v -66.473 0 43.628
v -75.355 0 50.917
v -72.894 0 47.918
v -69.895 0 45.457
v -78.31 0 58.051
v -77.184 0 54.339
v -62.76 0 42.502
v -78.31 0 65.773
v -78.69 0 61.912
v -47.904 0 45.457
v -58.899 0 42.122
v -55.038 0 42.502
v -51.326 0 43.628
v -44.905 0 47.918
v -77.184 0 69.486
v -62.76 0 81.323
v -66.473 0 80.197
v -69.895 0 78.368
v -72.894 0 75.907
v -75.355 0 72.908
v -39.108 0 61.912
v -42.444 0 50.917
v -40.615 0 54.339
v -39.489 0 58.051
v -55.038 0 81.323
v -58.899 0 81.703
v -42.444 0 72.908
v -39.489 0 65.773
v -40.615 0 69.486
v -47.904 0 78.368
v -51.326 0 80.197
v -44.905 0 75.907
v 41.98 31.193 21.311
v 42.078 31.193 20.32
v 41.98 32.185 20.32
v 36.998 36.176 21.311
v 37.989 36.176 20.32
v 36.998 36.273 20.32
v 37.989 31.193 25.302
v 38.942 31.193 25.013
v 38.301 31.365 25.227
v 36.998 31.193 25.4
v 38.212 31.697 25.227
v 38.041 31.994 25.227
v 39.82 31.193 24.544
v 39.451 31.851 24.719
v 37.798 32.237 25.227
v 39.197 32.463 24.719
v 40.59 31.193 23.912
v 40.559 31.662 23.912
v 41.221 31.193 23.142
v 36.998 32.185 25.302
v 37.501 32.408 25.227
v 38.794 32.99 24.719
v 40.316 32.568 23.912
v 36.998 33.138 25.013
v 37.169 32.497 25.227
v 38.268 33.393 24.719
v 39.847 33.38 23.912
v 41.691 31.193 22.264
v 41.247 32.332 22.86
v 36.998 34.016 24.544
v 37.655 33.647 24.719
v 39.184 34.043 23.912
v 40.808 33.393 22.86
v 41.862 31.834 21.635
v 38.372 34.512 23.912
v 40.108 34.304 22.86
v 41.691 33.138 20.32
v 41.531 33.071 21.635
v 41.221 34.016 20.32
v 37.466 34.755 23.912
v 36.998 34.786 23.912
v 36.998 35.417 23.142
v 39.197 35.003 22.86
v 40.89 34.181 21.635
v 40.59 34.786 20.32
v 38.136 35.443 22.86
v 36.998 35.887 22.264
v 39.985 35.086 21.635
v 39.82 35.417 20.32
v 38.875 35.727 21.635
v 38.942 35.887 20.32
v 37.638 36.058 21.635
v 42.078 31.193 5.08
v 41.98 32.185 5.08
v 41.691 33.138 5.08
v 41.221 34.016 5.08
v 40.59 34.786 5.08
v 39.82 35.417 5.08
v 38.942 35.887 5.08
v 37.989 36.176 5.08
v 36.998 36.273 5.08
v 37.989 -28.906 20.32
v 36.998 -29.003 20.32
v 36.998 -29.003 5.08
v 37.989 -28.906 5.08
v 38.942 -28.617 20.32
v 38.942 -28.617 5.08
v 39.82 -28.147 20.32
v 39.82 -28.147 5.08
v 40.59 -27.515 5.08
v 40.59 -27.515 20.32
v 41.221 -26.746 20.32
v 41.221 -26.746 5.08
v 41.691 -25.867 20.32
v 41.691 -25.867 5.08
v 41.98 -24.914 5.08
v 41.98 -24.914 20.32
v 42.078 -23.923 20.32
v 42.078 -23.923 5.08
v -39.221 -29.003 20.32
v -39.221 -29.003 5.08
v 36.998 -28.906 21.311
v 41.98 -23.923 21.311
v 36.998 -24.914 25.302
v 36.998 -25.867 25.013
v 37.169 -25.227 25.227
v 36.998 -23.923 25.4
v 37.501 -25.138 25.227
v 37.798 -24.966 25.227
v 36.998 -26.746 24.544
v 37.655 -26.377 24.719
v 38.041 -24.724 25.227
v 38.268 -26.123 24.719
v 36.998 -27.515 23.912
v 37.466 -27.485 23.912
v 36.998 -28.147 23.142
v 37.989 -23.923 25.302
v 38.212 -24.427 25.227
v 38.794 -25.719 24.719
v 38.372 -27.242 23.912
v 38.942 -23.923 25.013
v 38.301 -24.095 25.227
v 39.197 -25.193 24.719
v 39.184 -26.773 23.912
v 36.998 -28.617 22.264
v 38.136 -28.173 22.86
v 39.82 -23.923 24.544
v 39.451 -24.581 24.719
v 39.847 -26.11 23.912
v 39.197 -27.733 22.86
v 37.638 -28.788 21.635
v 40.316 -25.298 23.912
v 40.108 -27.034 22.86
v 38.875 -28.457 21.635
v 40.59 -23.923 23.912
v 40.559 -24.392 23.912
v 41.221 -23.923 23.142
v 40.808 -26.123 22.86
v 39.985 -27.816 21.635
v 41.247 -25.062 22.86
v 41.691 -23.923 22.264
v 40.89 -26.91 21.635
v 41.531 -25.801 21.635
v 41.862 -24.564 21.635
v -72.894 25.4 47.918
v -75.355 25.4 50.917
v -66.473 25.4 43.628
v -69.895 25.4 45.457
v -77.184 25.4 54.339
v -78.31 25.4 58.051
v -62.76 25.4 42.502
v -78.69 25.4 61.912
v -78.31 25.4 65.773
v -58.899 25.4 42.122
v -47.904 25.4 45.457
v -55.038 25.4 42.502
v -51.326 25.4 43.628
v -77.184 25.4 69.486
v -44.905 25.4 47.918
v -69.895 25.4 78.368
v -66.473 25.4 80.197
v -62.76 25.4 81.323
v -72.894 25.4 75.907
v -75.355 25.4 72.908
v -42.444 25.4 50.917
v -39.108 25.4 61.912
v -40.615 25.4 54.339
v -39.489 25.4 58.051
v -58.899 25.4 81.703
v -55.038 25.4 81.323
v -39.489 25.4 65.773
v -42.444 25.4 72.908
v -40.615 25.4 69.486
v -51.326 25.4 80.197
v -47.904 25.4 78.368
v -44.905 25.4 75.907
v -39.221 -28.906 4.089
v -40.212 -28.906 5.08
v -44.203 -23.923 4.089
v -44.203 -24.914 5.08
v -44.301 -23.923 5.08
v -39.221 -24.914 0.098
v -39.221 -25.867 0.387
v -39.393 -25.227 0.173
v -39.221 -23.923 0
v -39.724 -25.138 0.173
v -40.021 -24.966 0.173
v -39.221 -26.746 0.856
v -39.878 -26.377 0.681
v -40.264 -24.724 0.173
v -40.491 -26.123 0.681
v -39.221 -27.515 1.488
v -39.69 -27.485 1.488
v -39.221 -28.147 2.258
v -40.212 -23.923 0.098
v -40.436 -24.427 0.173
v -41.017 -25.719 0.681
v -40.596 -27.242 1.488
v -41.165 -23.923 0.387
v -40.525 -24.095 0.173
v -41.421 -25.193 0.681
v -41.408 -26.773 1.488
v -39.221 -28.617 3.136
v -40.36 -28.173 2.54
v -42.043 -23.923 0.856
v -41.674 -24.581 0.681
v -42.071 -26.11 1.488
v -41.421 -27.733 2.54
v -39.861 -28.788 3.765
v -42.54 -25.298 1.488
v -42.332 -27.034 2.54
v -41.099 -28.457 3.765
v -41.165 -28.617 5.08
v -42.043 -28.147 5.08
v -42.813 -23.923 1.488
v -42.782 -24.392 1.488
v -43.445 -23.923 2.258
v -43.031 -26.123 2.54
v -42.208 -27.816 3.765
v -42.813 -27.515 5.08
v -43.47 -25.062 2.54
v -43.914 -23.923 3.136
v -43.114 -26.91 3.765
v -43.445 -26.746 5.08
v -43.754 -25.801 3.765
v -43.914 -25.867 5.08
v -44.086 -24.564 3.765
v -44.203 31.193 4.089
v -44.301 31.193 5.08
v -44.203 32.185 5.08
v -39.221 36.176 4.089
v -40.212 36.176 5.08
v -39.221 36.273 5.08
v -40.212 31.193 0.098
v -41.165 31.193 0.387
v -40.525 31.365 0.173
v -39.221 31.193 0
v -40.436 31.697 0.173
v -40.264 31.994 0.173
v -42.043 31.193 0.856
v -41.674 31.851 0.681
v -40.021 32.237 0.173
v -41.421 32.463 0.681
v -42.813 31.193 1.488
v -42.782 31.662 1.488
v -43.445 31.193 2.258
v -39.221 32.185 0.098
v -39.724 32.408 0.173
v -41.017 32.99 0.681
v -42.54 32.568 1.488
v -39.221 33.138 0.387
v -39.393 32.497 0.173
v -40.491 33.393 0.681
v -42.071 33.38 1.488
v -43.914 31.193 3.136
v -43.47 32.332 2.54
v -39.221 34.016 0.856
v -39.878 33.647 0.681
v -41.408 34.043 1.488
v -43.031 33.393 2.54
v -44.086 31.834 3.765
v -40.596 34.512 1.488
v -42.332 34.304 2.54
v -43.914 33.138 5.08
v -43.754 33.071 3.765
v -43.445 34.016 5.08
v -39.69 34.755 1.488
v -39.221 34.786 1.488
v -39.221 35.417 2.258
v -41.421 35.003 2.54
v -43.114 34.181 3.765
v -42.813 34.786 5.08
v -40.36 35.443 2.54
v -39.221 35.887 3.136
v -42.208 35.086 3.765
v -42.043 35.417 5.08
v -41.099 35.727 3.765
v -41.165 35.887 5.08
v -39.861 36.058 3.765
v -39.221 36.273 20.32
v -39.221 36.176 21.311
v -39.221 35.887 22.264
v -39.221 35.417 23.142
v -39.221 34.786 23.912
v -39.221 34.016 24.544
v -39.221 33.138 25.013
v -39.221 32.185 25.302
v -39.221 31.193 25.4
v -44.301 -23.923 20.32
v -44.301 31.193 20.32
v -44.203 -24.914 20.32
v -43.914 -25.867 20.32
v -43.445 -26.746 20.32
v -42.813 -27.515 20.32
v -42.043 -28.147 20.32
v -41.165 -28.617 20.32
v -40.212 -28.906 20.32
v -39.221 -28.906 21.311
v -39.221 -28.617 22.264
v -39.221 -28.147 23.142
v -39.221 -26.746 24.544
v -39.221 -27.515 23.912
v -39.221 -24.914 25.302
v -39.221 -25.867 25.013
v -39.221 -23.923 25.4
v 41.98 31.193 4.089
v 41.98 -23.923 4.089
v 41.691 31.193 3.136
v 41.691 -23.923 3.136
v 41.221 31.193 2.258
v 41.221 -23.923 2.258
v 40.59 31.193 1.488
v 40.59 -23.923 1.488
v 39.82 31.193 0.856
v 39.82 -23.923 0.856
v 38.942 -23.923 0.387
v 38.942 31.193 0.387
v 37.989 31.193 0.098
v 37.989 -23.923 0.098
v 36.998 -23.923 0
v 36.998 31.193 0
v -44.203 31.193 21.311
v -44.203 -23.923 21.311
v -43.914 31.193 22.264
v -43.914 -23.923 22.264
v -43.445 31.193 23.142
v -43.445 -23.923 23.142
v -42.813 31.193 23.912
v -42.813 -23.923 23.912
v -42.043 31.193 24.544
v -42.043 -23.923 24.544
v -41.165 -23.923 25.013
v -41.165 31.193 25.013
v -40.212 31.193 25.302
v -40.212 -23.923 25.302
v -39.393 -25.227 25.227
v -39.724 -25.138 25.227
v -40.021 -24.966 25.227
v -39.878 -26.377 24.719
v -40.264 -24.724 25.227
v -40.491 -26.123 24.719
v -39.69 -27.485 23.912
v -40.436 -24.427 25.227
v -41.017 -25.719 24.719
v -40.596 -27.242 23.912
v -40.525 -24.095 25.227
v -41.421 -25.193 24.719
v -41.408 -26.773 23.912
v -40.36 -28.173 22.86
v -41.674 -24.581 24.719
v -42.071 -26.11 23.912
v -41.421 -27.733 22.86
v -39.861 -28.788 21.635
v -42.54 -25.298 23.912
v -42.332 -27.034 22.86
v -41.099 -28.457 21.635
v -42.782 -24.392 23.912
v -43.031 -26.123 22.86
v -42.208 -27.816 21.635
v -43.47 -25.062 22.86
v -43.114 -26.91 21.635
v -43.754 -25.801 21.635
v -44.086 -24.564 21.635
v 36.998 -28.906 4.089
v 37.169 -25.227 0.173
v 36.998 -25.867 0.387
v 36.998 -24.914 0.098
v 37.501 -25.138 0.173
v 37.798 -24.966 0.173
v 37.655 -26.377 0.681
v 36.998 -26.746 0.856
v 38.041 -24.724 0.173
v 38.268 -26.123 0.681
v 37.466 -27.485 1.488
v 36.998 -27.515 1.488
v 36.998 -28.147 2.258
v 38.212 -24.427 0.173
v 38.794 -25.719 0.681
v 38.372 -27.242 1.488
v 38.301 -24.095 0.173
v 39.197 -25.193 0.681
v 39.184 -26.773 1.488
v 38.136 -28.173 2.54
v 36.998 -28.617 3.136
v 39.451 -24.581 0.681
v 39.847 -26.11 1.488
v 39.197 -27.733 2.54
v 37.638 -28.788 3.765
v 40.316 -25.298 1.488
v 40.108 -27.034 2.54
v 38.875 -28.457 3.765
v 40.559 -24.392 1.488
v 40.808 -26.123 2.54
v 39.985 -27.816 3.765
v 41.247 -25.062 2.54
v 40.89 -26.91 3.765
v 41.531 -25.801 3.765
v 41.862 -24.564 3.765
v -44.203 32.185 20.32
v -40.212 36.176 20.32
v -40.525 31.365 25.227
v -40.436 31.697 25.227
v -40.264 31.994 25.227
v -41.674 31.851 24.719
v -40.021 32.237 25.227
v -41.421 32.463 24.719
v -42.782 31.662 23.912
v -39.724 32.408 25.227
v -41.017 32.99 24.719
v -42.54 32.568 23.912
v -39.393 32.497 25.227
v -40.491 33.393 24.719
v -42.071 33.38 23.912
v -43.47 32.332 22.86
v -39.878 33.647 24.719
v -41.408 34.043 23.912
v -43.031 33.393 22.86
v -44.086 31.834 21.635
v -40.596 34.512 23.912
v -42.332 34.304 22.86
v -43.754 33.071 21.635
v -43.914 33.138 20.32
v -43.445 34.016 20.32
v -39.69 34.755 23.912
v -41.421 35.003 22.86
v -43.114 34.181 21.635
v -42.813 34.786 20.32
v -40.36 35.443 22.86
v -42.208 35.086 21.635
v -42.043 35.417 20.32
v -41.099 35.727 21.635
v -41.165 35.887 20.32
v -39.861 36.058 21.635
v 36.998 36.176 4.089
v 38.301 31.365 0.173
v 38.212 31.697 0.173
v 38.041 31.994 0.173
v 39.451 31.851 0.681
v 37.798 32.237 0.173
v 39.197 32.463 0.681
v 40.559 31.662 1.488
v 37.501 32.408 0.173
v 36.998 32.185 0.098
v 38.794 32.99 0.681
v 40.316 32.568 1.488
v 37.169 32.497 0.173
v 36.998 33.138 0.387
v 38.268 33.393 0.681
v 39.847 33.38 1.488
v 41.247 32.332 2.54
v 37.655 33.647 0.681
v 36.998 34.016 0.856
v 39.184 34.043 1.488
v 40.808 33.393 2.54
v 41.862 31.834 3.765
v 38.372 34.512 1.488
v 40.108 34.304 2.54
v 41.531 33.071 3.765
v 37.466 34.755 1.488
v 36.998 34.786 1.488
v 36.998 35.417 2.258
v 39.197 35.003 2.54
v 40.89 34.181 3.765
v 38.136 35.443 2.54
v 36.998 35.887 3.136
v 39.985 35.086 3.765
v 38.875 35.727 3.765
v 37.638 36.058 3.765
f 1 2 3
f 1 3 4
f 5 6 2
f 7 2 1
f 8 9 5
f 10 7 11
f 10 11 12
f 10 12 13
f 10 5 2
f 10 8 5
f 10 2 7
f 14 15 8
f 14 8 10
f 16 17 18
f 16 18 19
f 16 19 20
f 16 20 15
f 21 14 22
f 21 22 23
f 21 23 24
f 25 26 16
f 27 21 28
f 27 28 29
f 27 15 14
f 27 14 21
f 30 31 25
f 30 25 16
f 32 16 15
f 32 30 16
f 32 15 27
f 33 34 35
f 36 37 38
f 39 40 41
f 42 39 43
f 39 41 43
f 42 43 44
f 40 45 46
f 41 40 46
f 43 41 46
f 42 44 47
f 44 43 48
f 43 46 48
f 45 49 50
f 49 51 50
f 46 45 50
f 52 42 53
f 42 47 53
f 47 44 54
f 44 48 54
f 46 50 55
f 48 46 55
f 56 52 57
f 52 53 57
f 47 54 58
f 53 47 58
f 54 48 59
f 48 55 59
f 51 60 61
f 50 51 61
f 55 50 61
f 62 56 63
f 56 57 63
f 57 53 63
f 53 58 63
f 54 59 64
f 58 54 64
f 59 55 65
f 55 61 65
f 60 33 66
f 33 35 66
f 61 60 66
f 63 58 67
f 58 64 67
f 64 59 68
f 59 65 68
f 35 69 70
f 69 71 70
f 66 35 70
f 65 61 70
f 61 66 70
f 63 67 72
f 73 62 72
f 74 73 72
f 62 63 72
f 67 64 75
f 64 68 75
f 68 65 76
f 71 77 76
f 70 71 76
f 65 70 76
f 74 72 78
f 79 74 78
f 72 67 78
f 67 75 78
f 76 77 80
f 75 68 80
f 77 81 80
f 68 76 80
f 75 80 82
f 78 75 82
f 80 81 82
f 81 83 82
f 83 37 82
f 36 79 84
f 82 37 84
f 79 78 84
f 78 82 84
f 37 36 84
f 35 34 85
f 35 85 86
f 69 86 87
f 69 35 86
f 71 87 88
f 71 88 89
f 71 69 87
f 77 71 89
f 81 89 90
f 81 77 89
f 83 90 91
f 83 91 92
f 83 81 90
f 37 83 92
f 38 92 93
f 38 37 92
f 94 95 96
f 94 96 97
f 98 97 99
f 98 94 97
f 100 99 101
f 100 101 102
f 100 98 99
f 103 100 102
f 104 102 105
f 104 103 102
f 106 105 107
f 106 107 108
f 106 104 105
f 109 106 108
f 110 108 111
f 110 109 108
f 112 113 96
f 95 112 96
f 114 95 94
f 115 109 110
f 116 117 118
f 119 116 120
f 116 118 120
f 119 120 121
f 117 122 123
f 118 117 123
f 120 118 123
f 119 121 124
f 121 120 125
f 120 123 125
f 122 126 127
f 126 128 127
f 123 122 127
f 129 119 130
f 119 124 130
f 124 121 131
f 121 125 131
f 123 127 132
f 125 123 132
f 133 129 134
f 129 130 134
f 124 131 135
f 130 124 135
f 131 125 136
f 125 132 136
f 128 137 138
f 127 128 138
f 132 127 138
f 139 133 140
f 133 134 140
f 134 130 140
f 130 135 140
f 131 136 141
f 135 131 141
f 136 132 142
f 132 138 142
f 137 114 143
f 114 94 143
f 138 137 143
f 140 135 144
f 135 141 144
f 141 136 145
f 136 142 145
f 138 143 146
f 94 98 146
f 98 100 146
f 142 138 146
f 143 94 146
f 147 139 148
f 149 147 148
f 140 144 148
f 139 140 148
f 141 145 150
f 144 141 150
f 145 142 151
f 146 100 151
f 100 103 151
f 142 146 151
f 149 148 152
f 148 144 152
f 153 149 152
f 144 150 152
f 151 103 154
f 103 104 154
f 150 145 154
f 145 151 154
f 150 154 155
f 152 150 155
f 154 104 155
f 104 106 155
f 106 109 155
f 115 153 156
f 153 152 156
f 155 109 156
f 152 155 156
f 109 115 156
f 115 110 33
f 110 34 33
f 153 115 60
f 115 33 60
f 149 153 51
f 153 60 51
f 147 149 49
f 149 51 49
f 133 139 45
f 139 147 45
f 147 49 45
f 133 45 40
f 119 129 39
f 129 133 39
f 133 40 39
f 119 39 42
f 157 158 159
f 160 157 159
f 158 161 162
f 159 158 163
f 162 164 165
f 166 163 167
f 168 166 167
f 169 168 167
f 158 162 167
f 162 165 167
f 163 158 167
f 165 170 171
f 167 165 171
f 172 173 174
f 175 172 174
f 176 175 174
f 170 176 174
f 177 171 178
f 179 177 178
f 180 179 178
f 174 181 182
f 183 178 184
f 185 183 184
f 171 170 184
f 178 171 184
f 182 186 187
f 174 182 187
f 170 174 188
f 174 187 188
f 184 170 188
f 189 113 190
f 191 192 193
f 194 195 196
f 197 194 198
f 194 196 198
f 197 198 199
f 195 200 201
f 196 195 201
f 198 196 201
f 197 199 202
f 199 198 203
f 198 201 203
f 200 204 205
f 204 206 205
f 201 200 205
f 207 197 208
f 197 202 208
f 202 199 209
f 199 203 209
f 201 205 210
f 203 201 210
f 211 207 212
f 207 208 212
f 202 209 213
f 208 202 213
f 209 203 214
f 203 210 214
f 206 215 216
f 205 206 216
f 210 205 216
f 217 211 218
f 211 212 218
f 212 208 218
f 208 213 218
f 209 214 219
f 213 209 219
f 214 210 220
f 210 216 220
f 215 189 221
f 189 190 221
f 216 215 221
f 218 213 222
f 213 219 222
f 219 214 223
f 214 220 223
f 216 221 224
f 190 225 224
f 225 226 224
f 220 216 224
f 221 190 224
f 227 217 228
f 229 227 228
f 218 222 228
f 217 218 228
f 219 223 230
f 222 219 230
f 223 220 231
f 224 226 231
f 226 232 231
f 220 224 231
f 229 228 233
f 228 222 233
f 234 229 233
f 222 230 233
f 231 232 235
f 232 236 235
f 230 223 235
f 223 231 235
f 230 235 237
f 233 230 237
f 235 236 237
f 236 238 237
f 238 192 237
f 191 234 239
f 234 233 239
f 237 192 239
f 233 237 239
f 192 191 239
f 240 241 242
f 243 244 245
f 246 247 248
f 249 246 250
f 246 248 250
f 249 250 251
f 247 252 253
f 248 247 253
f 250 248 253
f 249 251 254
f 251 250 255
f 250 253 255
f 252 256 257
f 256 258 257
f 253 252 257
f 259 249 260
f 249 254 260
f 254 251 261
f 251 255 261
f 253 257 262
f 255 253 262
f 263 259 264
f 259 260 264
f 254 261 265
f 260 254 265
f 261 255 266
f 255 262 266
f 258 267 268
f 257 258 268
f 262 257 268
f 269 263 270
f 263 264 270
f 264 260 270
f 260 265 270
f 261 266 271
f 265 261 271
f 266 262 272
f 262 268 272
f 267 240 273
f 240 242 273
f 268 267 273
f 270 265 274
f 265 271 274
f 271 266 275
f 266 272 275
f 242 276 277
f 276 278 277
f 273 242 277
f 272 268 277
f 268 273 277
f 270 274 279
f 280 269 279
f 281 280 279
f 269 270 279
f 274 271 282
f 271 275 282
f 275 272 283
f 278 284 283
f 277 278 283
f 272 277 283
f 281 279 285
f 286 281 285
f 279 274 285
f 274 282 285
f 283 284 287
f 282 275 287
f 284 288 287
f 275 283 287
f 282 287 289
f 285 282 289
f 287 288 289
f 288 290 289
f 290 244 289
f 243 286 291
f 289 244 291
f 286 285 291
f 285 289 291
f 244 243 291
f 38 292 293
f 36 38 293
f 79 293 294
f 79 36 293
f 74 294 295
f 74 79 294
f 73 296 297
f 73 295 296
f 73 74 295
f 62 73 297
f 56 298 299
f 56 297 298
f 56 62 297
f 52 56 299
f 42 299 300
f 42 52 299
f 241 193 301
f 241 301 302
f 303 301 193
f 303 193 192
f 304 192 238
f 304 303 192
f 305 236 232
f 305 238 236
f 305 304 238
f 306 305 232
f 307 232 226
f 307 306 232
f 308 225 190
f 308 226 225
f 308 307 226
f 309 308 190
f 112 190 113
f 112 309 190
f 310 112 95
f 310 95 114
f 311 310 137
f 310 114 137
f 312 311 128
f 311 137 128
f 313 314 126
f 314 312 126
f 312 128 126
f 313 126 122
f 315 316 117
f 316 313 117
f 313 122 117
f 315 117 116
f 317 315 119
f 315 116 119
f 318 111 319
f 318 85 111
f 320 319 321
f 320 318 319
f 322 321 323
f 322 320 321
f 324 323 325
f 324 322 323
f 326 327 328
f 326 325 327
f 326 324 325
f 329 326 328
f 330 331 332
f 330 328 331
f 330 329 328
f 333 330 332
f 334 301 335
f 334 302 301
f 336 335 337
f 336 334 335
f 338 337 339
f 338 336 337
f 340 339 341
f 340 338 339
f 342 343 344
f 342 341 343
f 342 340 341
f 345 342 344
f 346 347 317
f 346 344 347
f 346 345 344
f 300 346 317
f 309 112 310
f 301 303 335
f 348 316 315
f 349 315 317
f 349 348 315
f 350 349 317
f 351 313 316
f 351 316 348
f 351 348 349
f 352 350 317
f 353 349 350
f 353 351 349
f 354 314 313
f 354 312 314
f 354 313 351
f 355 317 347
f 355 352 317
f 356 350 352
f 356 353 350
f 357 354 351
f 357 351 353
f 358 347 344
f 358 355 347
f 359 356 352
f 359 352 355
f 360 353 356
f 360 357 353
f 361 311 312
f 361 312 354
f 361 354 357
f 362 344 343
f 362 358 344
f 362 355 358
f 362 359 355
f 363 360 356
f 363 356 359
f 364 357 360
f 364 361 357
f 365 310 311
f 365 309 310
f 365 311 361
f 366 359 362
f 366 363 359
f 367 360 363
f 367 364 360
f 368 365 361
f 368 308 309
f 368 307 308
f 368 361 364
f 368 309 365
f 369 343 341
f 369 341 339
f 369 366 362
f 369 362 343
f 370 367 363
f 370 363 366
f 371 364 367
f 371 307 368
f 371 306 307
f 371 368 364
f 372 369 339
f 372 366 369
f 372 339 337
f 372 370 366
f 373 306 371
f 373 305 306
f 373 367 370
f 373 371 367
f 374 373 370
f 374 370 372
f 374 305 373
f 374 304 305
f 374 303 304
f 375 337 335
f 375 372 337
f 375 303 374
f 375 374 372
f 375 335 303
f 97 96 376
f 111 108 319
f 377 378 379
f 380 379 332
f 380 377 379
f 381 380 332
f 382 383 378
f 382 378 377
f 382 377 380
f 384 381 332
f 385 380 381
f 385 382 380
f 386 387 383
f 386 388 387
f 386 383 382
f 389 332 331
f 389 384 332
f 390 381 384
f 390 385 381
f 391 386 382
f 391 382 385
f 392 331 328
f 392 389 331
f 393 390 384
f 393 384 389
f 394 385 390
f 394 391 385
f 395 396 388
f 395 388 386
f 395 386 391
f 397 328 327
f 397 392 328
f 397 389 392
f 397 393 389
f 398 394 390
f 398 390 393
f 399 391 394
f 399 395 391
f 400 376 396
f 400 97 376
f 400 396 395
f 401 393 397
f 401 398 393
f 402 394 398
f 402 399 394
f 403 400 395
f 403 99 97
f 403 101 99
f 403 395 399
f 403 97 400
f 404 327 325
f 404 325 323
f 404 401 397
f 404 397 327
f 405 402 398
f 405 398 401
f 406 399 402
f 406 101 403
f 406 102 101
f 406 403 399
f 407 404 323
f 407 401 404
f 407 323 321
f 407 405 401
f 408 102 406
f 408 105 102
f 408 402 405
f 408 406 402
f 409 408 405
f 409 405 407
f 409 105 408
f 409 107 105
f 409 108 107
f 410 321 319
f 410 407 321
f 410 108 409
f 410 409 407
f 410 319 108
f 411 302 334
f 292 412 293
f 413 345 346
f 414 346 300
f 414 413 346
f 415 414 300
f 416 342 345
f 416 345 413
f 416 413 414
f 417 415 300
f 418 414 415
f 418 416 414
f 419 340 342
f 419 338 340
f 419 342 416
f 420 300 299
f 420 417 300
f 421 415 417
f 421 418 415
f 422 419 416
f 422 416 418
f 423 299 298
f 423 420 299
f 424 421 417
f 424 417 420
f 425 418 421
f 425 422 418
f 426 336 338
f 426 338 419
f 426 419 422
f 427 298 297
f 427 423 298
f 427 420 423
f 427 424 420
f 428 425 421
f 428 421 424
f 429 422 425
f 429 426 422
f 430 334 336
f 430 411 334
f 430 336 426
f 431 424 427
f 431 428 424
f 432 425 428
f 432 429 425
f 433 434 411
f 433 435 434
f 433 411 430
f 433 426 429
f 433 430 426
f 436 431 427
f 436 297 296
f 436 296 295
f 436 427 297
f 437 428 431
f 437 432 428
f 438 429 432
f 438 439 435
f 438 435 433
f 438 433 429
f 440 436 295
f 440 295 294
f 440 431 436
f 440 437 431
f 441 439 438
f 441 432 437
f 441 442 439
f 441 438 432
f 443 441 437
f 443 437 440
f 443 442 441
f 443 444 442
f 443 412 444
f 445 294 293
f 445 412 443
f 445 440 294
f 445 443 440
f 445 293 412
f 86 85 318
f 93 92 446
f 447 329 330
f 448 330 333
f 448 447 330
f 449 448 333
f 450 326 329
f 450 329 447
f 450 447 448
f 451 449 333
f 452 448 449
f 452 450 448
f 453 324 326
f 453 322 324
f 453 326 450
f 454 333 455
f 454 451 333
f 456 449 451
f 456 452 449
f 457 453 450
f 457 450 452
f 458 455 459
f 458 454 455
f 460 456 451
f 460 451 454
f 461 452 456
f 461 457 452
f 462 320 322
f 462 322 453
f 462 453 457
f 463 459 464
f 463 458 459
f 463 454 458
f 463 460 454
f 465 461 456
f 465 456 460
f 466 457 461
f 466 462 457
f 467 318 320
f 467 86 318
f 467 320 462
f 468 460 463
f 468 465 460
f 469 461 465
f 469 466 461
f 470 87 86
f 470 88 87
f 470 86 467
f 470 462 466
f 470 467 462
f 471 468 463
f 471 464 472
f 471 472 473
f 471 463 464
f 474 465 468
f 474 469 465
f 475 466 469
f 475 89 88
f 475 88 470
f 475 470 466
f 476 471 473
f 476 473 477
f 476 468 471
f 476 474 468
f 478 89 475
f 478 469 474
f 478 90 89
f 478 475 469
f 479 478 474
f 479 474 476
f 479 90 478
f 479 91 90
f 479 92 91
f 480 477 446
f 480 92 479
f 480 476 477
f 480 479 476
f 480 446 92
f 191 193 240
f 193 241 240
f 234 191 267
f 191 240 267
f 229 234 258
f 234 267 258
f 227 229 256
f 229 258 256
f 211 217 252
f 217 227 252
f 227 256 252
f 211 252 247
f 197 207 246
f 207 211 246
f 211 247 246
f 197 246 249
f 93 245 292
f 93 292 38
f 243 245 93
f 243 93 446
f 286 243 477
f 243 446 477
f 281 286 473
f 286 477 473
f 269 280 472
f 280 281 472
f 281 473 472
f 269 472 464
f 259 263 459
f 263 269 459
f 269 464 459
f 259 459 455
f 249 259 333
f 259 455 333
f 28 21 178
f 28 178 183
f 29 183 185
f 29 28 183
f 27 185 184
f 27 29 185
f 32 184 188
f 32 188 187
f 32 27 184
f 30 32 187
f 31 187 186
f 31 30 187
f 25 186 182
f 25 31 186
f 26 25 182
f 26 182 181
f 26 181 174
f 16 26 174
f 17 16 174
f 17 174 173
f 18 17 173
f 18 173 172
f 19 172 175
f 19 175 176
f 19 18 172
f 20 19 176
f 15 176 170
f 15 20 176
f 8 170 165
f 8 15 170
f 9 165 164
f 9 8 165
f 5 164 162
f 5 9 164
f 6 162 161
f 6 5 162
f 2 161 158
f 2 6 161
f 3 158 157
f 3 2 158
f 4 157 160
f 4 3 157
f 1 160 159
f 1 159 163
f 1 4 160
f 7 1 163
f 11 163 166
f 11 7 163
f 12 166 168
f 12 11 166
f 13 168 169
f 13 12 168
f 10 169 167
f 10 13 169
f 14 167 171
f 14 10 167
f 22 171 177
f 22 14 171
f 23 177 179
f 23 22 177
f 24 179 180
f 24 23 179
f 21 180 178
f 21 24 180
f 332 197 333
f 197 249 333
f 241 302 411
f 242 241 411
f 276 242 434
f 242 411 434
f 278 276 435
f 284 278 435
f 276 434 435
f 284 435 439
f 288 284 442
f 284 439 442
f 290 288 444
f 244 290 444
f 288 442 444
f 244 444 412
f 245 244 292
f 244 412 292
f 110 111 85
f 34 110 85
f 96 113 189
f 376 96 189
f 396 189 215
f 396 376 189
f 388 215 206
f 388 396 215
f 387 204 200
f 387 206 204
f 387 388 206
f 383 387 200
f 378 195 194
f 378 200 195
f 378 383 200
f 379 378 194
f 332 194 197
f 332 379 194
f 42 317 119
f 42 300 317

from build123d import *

# Parameters (mm, degrees)
F0_W     = 86.378537
F0_H     = 65.276827
F1_DEPTH = 25.4
F2_R     = 5.08
F3_R     = 19.790864
F4_DEPTH = 25.4


with BuildPart() as f1:
    # F0 (on Top) → F1 (new body)
    with BuildSketch(Plane.XY):
        with Locations((-1.111719, 3.635055)):
            Rectangle(F0_W, F0_H)
    extrude(amount=F1_DEPTH)

    # F2
    f2_edges = [f1.edges().sort_by_distance(p)[0] for p in [
        (-44.300988, -29.003359, 12.7),
        (42.077549, -29.003359, 12.7),
        (-1.11172, -29.003359, 0),
        (-1.11172, -29.003359, 25.4),
        (42.077549, 36.273468, 12.7),
        (42.077549, 3.635054, 0),
        (42.077549, 3.635054, 25.4),
        (-44.300988, 36.273468, 12.7),
        (-44.300988, 3.635054, 0),
        (-44.300988, 3.635054, 25.4),
        (-1.11172, 36.273468, 0),
        (-1.11172, 36.273468, 25.4),
    ]]
    fillet(f2_edges, radius=F2_R)


with BuildPart() as f4:
    # F3 (on Front) → F4 (new body)
    with BuildSketch(Plane.XZ):
        with Locations((-58.899298, 61.912473)):
            Circle(F3_R)
    extrude(amount=-F4_DEPTH)


solid = Compound([f1.part, f4.part])
